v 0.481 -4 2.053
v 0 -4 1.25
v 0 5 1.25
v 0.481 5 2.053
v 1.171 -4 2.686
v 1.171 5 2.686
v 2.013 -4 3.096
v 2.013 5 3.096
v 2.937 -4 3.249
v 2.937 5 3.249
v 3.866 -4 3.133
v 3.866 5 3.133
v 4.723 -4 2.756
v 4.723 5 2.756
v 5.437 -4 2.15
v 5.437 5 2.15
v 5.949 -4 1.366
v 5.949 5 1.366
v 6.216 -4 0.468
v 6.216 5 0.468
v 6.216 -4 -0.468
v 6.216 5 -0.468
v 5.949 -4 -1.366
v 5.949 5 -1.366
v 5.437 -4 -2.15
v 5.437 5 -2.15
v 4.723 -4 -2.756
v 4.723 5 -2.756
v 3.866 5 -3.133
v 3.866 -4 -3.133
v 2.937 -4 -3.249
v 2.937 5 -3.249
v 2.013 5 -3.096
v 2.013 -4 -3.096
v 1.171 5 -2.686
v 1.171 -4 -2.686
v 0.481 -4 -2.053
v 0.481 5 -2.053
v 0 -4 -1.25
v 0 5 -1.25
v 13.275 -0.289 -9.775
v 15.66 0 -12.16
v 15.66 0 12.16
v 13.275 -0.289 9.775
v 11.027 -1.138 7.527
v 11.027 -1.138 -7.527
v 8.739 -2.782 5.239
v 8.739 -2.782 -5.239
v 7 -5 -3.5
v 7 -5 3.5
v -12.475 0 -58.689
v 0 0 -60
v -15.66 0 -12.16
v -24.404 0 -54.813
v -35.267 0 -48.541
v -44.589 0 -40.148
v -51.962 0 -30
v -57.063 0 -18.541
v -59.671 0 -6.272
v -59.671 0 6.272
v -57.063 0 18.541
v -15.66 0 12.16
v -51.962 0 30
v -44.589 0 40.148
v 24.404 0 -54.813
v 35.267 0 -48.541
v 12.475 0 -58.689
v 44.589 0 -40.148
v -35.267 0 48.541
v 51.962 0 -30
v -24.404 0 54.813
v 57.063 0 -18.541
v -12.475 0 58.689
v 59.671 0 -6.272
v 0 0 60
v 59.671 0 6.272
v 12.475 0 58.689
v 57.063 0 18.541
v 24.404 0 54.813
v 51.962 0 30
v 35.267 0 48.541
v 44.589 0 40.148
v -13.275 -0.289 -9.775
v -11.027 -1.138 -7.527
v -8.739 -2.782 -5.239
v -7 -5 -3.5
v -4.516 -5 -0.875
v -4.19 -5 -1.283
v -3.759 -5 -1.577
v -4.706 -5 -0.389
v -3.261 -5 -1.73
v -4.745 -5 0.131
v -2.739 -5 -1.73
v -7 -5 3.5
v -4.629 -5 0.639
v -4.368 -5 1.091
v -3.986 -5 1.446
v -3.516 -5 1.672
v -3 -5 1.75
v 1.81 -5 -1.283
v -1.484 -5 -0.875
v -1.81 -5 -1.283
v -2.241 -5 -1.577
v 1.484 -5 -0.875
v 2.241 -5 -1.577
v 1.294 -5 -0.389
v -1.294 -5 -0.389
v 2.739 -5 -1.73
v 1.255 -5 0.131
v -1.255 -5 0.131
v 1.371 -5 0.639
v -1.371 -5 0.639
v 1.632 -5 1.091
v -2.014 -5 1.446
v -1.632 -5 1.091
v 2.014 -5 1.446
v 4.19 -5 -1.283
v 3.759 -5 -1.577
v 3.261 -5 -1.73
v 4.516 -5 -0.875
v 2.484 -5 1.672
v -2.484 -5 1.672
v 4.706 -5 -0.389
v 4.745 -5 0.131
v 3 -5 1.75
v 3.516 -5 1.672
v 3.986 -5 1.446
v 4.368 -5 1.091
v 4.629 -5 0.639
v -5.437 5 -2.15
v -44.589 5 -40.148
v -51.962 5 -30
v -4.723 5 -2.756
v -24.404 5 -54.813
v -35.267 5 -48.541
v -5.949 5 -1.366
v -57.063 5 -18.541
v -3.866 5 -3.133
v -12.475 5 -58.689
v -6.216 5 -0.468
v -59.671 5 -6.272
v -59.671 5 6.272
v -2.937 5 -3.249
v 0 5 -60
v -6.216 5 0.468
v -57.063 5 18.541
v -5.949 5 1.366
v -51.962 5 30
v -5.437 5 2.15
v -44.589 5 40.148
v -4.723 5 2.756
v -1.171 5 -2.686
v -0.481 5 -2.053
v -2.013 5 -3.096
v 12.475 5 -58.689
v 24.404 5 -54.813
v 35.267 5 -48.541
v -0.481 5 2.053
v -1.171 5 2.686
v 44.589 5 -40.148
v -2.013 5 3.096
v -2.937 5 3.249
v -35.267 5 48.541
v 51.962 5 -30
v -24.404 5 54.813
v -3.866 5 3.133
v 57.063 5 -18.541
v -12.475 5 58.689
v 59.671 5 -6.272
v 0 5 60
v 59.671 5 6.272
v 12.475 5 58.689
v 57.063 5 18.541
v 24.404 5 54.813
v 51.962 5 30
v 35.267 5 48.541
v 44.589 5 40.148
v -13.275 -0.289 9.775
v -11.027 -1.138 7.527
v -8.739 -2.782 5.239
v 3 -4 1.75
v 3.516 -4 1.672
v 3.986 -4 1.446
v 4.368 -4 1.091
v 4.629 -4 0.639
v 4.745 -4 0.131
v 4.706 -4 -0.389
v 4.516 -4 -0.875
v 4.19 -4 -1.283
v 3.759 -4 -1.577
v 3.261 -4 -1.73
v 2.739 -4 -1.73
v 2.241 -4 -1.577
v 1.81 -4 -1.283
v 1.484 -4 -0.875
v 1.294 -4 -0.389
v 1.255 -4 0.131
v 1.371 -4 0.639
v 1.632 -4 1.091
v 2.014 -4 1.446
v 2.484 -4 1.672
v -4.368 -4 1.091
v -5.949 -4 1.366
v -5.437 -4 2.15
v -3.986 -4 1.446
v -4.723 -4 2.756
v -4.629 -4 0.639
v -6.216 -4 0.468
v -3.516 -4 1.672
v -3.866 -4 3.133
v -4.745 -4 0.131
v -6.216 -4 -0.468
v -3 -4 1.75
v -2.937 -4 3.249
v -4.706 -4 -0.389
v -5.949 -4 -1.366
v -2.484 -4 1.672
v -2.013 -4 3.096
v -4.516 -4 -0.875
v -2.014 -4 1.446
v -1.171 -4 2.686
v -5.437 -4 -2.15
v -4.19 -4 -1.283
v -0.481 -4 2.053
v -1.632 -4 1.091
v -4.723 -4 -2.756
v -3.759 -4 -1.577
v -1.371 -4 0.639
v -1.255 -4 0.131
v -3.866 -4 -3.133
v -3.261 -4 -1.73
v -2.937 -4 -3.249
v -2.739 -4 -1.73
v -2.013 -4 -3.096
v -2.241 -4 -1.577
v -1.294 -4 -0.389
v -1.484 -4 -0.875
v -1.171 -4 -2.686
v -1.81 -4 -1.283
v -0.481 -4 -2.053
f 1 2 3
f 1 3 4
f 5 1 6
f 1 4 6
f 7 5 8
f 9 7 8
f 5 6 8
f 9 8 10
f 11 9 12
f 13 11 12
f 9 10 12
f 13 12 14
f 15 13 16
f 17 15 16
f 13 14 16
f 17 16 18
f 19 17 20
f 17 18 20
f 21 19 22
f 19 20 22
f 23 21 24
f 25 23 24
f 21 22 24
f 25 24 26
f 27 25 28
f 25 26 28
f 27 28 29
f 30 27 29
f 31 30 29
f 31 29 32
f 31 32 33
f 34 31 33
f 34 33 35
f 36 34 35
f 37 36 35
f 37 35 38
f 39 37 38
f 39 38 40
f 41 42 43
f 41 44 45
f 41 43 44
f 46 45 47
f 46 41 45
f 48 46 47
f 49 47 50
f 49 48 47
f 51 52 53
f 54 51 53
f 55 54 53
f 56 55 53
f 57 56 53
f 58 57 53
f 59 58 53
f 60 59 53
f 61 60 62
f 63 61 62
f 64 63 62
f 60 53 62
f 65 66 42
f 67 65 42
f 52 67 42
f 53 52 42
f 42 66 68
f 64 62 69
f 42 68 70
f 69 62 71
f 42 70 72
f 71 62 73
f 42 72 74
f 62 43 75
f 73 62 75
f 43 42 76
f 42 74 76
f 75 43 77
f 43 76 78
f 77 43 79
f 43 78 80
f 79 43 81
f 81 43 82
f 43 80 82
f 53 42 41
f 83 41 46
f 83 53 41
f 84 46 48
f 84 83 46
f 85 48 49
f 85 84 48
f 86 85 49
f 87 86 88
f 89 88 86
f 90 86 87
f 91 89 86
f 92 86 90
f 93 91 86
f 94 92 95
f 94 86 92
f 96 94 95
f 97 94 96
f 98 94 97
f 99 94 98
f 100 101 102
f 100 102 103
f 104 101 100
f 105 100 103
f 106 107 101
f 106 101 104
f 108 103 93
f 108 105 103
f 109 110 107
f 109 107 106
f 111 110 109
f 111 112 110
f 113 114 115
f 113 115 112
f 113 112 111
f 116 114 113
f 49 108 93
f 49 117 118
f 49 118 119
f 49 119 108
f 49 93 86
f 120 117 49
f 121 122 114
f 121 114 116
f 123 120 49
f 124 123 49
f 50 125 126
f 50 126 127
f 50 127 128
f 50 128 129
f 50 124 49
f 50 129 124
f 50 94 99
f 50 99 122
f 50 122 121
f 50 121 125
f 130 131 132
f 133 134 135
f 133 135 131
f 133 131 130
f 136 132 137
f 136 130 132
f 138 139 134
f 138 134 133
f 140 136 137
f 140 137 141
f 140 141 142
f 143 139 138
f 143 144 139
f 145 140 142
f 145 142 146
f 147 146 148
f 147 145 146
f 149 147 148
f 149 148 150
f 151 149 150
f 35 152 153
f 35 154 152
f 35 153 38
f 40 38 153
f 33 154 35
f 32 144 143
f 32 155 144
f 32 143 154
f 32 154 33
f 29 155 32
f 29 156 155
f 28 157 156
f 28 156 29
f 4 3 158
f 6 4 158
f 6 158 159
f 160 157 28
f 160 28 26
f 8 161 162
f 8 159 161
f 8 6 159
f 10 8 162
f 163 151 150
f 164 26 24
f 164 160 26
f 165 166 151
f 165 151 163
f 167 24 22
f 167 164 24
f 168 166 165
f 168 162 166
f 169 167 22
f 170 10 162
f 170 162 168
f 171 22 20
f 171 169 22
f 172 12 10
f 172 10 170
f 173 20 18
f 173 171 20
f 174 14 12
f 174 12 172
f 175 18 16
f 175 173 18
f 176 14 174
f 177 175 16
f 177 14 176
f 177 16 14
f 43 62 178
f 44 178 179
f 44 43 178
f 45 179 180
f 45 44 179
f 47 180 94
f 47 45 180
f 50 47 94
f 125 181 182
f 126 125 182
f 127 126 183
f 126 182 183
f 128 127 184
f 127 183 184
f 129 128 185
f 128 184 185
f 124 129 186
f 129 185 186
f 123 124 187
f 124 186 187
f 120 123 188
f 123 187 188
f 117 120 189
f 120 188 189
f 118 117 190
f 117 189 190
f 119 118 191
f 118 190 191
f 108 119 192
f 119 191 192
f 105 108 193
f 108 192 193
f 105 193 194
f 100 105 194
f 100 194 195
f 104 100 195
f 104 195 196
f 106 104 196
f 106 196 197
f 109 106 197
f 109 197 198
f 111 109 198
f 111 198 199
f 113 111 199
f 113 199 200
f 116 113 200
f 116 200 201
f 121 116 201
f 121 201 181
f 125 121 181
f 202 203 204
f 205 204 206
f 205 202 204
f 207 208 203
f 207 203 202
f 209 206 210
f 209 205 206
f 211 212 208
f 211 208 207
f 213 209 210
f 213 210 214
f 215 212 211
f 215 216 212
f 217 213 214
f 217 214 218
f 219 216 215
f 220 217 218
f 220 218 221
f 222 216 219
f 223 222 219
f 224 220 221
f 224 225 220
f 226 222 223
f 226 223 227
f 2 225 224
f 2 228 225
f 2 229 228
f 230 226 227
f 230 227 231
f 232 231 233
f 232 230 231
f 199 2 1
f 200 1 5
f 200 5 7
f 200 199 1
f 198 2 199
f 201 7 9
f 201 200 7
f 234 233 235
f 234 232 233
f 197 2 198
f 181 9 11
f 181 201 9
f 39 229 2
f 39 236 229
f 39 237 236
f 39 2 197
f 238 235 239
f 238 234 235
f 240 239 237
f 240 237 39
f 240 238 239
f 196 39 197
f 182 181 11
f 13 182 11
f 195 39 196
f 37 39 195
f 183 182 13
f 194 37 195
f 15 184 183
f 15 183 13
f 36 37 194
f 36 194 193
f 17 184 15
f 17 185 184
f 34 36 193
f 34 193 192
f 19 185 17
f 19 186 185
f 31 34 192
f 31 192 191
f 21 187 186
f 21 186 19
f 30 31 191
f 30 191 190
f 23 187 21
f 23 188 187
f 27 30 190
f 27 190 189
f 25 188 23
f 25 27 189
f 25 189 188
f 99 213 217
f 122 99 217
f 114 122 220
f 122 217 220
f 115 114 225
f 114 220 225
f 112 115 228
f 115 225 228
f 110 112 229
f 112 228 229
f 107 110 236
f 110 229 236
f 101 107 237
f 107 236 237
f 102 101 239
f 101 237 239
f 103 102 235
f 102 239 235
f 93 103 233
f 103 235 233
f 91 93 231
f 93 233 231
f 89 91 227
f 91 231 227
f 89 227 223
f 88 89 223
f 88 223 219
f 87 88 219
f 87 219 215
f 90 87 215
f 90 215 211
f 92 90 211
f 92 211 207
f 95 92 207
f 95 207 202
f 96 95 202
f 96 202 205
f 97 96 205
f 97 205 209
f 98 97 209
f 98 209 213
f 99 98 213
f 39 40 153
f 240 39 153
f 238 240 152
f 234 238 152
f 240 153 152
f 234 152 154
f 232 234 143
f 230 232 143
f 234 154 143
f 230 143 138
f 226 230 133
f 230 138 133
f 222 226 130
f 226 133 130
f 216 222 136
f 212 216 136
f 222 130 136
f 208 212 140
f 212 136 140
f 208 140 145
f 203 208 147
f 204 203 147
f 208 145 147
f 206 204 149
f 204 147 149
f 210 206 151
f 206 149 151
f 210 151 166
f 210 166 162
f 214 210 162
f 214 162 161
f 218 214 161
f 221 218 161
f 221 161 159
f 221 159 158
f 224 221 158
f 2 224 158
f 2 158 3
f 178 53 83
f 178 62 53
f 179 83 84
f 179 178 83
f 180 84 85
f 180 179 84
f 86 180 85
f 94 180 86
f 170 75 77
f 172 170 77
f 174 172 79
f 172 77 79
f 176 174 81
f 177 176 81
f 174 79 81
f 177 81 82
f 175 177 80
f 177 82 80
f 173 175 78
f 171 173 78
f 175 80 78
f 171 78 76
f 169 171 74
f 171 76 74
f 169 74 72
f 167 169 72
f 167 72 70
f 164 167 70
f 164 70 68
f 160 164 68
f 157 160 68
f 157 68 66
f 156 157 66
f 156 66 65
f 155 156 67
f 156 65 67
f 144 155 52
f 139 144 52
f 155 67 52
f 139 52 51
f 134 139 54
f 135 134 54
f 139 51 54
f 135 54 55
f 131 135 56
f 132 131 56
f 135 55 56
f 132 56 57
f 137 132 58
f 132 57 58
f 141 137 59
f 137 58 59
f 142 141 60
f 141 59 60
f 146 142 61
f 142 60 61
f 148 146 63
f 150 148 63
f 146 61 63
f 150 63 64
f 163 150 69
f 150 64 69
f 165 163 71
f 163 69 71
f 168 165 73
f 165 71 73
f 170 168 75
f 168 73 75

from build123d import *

# Parameters (mm, degrees)
SKETCH1_R           = 60
BOSS_EXTRUDE1_DEPTH = 5
SKETCH3_W           = 14
SKETCH3_H           = 7
BOSS_EXTRUDE2_DEPTH = 5
SKETCH4_R           = 3.25
CUT_EXTRUDE1_DEPTH  = 9
SKETCH7_R           = 1.75
CUT_EXTRUDE2_DEPTH  = 5
FILLET1_R           = 10


with BuildPart() as part:
    # Sketch1 → Boss-Extrude1 (new body)
    with BuildSketch(Plane(origin=(0, 0, 0), x_dir=(1, 0, 0), z_dir=(0, 1, 0))):
        with Locations(Location((0, 0, 0), (0, 0, 270))):
            Circle(SKETCH1_R)
    extrude(amount=BOSS_EXTRUDE1_DEPTH)

    # Sketch3 → Boss-Extrude2 (add)
    with BuildSketch(Plane.XZ):
        Rectangle(SKETCH3_W, SKETCH3_H)
    extrude(amount=BOSS_EXTRUDE2_DEPTH)

    # Sketch4 → Cut-Extrude1 (cut)
    with BuildSketch(Plane(origin=(0, 5, 0), x_dir=(1, 0, 0), z_dir=(0, 1, 0))):
        with Locations((3, 0)):
            Circle(SKETCH4_R)
        with Locations((-3, 0)):
            Circle(SKETCH4_R)
    extrude(amount=-CUT_EXTRUDE1_DEPTH, mode=Mode.SUBTRACT)

    # Sketch7 → Cut-Extrude2 (cut)
    with BuildSketch(Plane(origin=(0, -4, 0), x_dir=(1, 0, 0), z_dir=(0, 1, 0))):
        with Locations(Location((-3, 0, 0), (0, 0, 270))):
            Circle(SKETCH7_R)
        with Locations(Location((3, 0, 0), (0, 0, 270))):
            Circle(SKETCH7_R)
    extrude(amount=-CUT_EXTRUDE2_DEPTH, mode=Mode.SUBTRACT)

    # Fillet1
    # the kernel refuses this fillet: 10 mm, written as the material it adds along each edge
    with BuildSketch(Plane(origin=(7, 0, 3.5), x_dir=(0, 0, 1), z_dir=(-1, 0, 0)), Plane(origin=(-7, 0, -3.5), x_dir=(0, 0, -1), z_dir=(1, 0, 0))) as fillet1_piece_1:
        with BuildLine():
            CenterArc((8.660254038, -10), FILLET1_R, 90, 60)
            Line((0, -5), (-0.173205081, -4.9))
            ThreePointArc((-0.173205081, -4.9), (-0.2, -2.5), (-0.2, 0))
            Line((-0.2, 0), (0, 0.2))
            Line((0, 0.2), (8.660254038, 0.2))
            Line((8.660254038, 0.2), (8.660254038, 0))
        make_face()
    extrude(amount=14)
    with BuildSketch(Plane(origin=(7, 0, -3.5), x_dir=(1, 0, 0), z_dir=(0, 0, 1)), Plane(origin=(-7, 0, 3.5), x_dir=(-1, 0, 0), z_dir=(0, 0, -1))) as fillet1_piece_2:
        with BuildLine():
            CenterArc((8.660254038, -10), FILLET1_R, 90, 60)
            Line((0, -5), (-0.173205081, -4.9))
            ThreePointArc((-0.173205081, -4.9), (-0.2, -2.5), (-0.2, 0))
            Line((-0.2, 0), (0, 0.2))
            Line((0, 0.2), (8.660254038, 0.2))
            Line((8.660254038, 0.2), (8.660254038, 0))
        make_face()
    extrude(amount=7)
    with BuildSketch(Plane(origin=(28.650635095, 0, 3.5), x_dir=(0, 0, 1), z_dir=(-1, 0, 0))) as fillet1_piece_3a_section:
        with BuildLine():
            CenterArc((8.660254038, -10), FILLET1_R, 90, 60)
            Line((0, -5), (-0.173205081, -4.9))
            ThreePointArc((-0.173205081, -4.9), (-0.2, -2.5), (-0.2, 0))
            Line((-0.2, 0), (0, 0.2))
            Line((0, 0.2), (8.660254038, 0.2))
            Line((8.660254038, 0.2), (8.660254038, 0))
        make_face()
    fillet1_piece_3a = extrude(amount=35.650635095, mode=Mode.PRIVATE)
    fillet1_piece_3a = split(fillet1_piece_3a, bisect_by=Plane(origin=(7, -1.295167111, 5.663104458), z_dir=(1, 0, 0)), keep=Keep.TOP, mode=Mode.PRIVATE)
    with BuildSketch(Plane(origin=(7, 0, -3.5), x_dir=(1, 0, 0), z_dir=(0, 0, 1))) as fillet1_piece_3b_section:
        with BuildLine():
            CenterArc((8.660254038, -10), FILLET1_R, 90, 60)
            Line((0, -5), (-0.173205081, -4.9))
            ThreePointArc((-0.173205081, -4.9), (-0.2, -2.5), (-0.2, 0))
            Line((-0.2, 0), (0, 0.2))
            Line((0, 0.2), (8.660254038, 0.2))
            Line((8.660254038, 0.2), (8.660254038, 0))
        make_face()
    fillet1_piece_3b = extrude(amount=28.650635095, mode=Mode.PRIVATE)
    fillet1_piece_3b = split(fillet1_piece_3b, bisect_by=Plane(origin=(9.163104458, -1.295167111, 3.5), z_dir=(0, 0, 1)), keep=Keep.TOP, mode=Mode.PRIVATE)
    fillet1_piece_3 = fillet1_piece_3a & fillet1_piece_3b
    add(fillet1_piece_3)
    with BuildSketch(Plane(origin=(-7, 0, 25.150635095), x_dir=(-1, 0, 0), z_dir=(0, 0, -1))) as fillet1_piece_4a_section:
        with BuildLine():
            CenterArc((8.660254038, -10), FILLET1_R, 90, 60)
            Line((0, -5), (-0.173205081, -4.9))
            ThreePointArc((-0.173205081, -4.9), (-0.2, -2.5), (-0.2, 0))
            Line((-0.2, 0), (0, 0.2))
            Line((0, 0.2), (8.660254038, 0.2))
            Line((8.660254038, 0.2), (8.660254038, 0))
        make_face()
    fillet1_piece_4a = extrude(amount=28.650635095, mode=Mode.PRIVATE)
    fillet1_piece_4a = split(fillet1_piece_4a, bisect_by=Plane(origin=(-9.163104458, -1.295167111, 3.5), z_dir=(0, 0, 1)), keep=Keep.TOP, mode=Mode.PRIVATE)
    with BuildSketch(Plane(origin=(7, 0, 3.5), x_dir=(0, 0, 1), z_dir=(-1, 0, 0))) as fillet1_piece_4b_section:
        with BuildLine():
            CenterArc((8.660254038, -10), FILLET1_R, 90, 60)
            Line((0, -5), (-0.173205081, -4.9))
            ThreePointArc((-0.173205081, -4.9), (-0.2, -2.5), (-0.2, 0))
            Line((-0.2, 0), (0, 0.2))
            Line((0, 0.2), (8.660254038, 0.2))
            Line((8.660254038, 0.2), (8.660254038, 0))
        make_face()
    fillet1_piece_4b = extrude(amount=35.650635095, mode=Mode.PRIVATE)
    fillet1_piece_4b = split(fillet1_piece_4b, bisect_by=Plane(origin=(-7, -1.295167111, 5.663104458), z_dir=(-1, 0, 0)), keep=Keep.TOP, mode=Mode.PRIVATE)
    fillet1_piece_4 = fillet1_piece_4a & fillet1_piece_4b
    add(fillet1_piece_4)
    with BuildSketch(Plane(origin=(7, 0, -25.150635095), x_dir=(1, 0, 0), z_dir=(0, 0, 1))) as fillet1_piece_5a_section:
        with BuildLine():
            CenterArc((8.660254038, -10), FILLET1_R, 90, 60)
            Line((0, -5), (-0.173205081, -4.9))
            ThreePointArc((-0.173205081, -4.9), (-0.2, -2.5), (-0.2, 0))
            Line((-0.2, 0), (0, 0.2))
            Line((0, 0.2), (8.660254038, 0.2))
            Line((8.660254038, 0.2), (8.660254038, 0))
        make_face()
    fillet1_piece_5a = extrude(amount=28.650635095, mode=Mode.PRIVATE)
    fillet1_piece_5a = split(fillet1_piece_5a, bisect_by=Plane(origin=(9.163104458, -1.295167111, -3.5), z_dir=(0, 0, -1)), keep=Keep.TOP, mode=Mode.PRIVATE)
    with BuildSketch(Plane(origin=(-7, 0, -3.5), x_dir=(0, 0, -1), z_dir=(1, 0, 0))) as fillet1_piece_5b_section:
        with BuildLine():
            CenterArc((8.660254038, -10), FILLET1_R, 90, 60)
            Line((0, -5), (-0.173205081, -4.9))
            ThreePointArc((-0.173205081, -4.9), (-0.2, -2.5), (-0.2, 0))
            Line((-0.2, 0), (0, 0.2))
            Line((0, 0.2), (8.660254038, 0.2))
            Line((8.660254038, 0.2), (8.660254038, 0))
        make_face()
    fillet1_piece_5b = extrude(amount=35.650635095, mode=Mode.PRIVATE)
    fillet1_piece_5b = split(fillet1_piece_5b, bisect_by=Plane(origin=(7, -1.295167111, -5.663104458), z_dir=(1, 0, 0)), keep=Keep.TOP, mode=Mode.PRIVATE)
    fillet1_piece_5 = fillet1_piece_5a & fillet1_piece_5b
    add(fillet1_piece_5)
    with BuildSketch(Plane(origin=(-7, 0, 3.5), x_dir=(-1, 0, 0), z_dir=(0, 0, -1))) as fillet1_piece_6a_section:
        with BuildLine():
            CenterArc((8.660254038, -10), FILLET1_R, 90, 60)
            Line((0, -5), (-0.173205081, -4.9))
            ThreePointArc((-0.173205081, -4.9), (-0.2, -2.5), (-0.2, 0))
            Line((-0.2, 0), (0, 0.2))
            Line((0, 0.2), (8.660254038, 0.2))
            Line((8.660254038, 0.2), (8.660254038, 0))
        make_face()
    fillet1_piece_6a = extrude(amount=28.650635095, mode=Mode.PRIVATE)
    fillet1_piece_6a = split(fillet1_piece_6a, bisect_by=Plane(origin=(-9.163104458, -1.295167111, -3.5), z_dir=(0, 0, -1)), keep=Keep.TOP, mode=Mode.PRIVATE)
    with BuildSketch(Plane(origin=(-28.650635095, 0, -3.5), x_dir=(0, 0, -1), z_dir=(1, 0, 0))) as fillet1_piece_6b_section:
        with BuildLine():
            CenterArc((8.660254038, -10), FILLET1_R, 90, 60)
            Line((0, -5), (-0.173205081, -4.9))
            ThreePointArc((-0.173205081, -4.9), (-0.2, -2.5), (-0.2, 0))
            Line((-0.2, 0), (0, 0.2))
            Line((0, 0.2), (8.660254038, 0.2))
            Line((8.660254038, 0.2), (8.660254038, 0))
        make_face()
    fillet1_piece_6b = extrude(amount=35.650635095, mode=Mode.PRIVATE)
    fillet1_piece_6b = split(fillet1_piece_6b, bisect_by=Plane(origin=(-7, -1.295167111, -5.663104458), z_dir=(-1, 0, 0)), keep=Keep.TOP, mode=Mode.PRIVATE)
    fillet1_piece_6 = fillet1_piece_6a & fillet1_piece_6b
    add(fillet1_piece_6)


solid = part.part
